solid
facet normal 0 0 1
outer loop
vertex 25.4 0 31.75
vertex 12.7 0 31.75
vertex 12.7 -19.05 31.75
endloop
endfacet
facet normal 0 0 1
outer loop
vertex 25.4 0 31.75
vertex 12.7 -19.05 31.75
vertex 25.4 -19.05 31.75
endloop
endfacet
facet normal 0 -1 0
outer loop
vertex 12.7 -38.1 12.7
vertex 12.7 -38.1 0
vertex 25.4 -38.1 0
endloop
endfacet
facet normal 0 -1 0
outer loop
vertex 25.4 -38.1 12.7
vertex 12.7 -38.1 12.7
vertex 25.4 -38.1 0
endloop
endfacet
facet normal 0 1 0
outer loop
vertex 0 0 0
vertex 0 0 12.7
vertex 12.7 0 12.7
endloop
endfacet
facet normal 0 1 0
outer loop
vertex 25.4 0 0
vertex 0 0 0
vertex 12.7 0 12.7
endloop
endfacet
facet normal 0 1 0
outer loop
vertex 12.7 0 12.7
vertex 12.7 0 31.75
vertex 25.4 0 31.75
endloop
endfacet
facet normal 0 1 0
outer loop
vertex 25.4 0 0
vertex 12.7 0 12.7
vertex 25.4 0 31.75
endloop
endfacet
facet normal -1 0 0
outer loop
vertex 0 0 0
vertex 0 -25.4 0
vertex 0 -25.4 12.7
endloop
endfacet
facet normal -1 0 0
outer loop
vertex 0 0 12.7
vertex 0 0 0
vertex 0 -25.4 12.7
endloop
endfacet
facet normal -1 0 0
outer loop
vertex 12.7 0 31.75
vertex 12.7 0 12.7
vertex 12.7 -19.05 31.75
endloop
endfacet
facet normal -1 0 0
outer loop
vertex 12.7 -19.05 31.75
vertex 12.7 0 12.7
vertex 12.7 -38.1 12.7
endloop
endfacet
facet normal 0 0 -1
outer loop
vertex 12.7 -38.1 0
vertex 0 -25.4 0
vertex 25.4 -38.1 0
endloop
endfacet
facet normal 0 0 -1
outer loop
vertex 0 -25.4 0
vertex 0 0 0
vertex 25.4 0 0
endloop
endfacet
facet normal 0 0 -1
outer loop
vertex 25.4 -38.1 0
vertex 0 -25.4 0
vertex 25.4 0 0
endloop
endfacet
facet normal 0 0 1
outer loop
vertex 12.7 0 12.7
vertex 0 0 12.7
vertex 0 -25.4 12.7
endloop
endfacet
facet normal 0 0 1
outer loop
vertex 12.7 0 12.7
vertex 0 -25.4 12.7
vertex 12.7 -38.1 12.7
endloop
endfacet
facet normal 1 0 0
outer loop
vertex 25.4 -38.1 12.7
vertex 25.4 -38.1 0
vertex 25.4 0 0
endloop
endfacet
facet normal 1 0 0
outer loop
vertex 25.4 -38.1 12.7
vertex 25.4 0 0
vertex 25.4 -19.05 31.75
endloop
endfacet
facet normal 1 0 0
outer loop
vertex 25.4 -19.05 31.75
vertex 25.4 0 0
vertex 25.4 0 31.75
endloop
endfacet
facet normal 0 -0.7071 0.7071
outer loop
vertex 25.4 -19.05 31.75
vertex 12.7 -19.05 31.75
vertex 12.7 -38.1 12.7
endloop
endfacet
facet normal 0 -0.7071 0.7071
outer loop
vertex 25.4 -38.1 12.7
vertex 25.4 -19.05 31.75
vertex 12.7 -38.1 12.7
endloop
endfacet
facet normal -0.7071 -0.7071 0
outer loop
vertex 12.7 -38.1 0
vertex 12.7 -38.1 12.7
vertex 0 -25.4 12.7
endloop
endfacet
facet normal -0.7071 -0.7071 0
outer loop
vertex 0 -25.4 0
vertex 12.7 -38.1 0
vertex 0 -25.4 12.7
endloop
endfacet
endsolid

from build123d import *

# Parameters (mm, degrees)
F0_W     = 25.4
F0_H     = 31.75
F1_DEPTH = 38.1
F2_W     = 12.7
F2_H     = 19.05
F3_DEPTH = 38.1
F5_DEPTH = 25.4
F7_DEPTH = 25.4


with BuildPart() as f1:
    # F0 (on Front) → F1 (new body)
    with BuildSketch(Plane.XZ):
        with Locations((12.7, 15.875)):
            Rectangle(F0_W, F0_H)
    extrude(amount=F1_DEPTH)

    # F2 (on face) → F3 (cut)
    with BuildSketch(Plane.XZ.offset(38.1)):
        with Locations((6.35, 22.225)):
            Rectangle(F2_W, F2_H)
    extrude(amount=-F3_DEPTH, mode=Mode.SUBTRACT)

    # F4 (on face) → F5 (cut)
    with BuildSketch(Plane(origin=(12.7, 0, 0), x_dir=(0, -1, 0), z_dir=(-1, 0, 0))):
        Polygon((38.1, 12.7), (38.1, 31.75), (19.05, 31.75), align=None)
    extrude(amount=-F5_DEPTH, mode=Mode.SUBTRACT)

    # F6 (on face) → F7 (cut)
    with BuildSketch(Plane.XY.offset(12.7)):
        Polygon((0, -25.4), (0, -38.1), (12.7, -38.1), align=None)
    extrude(amount=-F7_DEPTH, mode=Mode.SUBTRACT)


solid = f1.part
